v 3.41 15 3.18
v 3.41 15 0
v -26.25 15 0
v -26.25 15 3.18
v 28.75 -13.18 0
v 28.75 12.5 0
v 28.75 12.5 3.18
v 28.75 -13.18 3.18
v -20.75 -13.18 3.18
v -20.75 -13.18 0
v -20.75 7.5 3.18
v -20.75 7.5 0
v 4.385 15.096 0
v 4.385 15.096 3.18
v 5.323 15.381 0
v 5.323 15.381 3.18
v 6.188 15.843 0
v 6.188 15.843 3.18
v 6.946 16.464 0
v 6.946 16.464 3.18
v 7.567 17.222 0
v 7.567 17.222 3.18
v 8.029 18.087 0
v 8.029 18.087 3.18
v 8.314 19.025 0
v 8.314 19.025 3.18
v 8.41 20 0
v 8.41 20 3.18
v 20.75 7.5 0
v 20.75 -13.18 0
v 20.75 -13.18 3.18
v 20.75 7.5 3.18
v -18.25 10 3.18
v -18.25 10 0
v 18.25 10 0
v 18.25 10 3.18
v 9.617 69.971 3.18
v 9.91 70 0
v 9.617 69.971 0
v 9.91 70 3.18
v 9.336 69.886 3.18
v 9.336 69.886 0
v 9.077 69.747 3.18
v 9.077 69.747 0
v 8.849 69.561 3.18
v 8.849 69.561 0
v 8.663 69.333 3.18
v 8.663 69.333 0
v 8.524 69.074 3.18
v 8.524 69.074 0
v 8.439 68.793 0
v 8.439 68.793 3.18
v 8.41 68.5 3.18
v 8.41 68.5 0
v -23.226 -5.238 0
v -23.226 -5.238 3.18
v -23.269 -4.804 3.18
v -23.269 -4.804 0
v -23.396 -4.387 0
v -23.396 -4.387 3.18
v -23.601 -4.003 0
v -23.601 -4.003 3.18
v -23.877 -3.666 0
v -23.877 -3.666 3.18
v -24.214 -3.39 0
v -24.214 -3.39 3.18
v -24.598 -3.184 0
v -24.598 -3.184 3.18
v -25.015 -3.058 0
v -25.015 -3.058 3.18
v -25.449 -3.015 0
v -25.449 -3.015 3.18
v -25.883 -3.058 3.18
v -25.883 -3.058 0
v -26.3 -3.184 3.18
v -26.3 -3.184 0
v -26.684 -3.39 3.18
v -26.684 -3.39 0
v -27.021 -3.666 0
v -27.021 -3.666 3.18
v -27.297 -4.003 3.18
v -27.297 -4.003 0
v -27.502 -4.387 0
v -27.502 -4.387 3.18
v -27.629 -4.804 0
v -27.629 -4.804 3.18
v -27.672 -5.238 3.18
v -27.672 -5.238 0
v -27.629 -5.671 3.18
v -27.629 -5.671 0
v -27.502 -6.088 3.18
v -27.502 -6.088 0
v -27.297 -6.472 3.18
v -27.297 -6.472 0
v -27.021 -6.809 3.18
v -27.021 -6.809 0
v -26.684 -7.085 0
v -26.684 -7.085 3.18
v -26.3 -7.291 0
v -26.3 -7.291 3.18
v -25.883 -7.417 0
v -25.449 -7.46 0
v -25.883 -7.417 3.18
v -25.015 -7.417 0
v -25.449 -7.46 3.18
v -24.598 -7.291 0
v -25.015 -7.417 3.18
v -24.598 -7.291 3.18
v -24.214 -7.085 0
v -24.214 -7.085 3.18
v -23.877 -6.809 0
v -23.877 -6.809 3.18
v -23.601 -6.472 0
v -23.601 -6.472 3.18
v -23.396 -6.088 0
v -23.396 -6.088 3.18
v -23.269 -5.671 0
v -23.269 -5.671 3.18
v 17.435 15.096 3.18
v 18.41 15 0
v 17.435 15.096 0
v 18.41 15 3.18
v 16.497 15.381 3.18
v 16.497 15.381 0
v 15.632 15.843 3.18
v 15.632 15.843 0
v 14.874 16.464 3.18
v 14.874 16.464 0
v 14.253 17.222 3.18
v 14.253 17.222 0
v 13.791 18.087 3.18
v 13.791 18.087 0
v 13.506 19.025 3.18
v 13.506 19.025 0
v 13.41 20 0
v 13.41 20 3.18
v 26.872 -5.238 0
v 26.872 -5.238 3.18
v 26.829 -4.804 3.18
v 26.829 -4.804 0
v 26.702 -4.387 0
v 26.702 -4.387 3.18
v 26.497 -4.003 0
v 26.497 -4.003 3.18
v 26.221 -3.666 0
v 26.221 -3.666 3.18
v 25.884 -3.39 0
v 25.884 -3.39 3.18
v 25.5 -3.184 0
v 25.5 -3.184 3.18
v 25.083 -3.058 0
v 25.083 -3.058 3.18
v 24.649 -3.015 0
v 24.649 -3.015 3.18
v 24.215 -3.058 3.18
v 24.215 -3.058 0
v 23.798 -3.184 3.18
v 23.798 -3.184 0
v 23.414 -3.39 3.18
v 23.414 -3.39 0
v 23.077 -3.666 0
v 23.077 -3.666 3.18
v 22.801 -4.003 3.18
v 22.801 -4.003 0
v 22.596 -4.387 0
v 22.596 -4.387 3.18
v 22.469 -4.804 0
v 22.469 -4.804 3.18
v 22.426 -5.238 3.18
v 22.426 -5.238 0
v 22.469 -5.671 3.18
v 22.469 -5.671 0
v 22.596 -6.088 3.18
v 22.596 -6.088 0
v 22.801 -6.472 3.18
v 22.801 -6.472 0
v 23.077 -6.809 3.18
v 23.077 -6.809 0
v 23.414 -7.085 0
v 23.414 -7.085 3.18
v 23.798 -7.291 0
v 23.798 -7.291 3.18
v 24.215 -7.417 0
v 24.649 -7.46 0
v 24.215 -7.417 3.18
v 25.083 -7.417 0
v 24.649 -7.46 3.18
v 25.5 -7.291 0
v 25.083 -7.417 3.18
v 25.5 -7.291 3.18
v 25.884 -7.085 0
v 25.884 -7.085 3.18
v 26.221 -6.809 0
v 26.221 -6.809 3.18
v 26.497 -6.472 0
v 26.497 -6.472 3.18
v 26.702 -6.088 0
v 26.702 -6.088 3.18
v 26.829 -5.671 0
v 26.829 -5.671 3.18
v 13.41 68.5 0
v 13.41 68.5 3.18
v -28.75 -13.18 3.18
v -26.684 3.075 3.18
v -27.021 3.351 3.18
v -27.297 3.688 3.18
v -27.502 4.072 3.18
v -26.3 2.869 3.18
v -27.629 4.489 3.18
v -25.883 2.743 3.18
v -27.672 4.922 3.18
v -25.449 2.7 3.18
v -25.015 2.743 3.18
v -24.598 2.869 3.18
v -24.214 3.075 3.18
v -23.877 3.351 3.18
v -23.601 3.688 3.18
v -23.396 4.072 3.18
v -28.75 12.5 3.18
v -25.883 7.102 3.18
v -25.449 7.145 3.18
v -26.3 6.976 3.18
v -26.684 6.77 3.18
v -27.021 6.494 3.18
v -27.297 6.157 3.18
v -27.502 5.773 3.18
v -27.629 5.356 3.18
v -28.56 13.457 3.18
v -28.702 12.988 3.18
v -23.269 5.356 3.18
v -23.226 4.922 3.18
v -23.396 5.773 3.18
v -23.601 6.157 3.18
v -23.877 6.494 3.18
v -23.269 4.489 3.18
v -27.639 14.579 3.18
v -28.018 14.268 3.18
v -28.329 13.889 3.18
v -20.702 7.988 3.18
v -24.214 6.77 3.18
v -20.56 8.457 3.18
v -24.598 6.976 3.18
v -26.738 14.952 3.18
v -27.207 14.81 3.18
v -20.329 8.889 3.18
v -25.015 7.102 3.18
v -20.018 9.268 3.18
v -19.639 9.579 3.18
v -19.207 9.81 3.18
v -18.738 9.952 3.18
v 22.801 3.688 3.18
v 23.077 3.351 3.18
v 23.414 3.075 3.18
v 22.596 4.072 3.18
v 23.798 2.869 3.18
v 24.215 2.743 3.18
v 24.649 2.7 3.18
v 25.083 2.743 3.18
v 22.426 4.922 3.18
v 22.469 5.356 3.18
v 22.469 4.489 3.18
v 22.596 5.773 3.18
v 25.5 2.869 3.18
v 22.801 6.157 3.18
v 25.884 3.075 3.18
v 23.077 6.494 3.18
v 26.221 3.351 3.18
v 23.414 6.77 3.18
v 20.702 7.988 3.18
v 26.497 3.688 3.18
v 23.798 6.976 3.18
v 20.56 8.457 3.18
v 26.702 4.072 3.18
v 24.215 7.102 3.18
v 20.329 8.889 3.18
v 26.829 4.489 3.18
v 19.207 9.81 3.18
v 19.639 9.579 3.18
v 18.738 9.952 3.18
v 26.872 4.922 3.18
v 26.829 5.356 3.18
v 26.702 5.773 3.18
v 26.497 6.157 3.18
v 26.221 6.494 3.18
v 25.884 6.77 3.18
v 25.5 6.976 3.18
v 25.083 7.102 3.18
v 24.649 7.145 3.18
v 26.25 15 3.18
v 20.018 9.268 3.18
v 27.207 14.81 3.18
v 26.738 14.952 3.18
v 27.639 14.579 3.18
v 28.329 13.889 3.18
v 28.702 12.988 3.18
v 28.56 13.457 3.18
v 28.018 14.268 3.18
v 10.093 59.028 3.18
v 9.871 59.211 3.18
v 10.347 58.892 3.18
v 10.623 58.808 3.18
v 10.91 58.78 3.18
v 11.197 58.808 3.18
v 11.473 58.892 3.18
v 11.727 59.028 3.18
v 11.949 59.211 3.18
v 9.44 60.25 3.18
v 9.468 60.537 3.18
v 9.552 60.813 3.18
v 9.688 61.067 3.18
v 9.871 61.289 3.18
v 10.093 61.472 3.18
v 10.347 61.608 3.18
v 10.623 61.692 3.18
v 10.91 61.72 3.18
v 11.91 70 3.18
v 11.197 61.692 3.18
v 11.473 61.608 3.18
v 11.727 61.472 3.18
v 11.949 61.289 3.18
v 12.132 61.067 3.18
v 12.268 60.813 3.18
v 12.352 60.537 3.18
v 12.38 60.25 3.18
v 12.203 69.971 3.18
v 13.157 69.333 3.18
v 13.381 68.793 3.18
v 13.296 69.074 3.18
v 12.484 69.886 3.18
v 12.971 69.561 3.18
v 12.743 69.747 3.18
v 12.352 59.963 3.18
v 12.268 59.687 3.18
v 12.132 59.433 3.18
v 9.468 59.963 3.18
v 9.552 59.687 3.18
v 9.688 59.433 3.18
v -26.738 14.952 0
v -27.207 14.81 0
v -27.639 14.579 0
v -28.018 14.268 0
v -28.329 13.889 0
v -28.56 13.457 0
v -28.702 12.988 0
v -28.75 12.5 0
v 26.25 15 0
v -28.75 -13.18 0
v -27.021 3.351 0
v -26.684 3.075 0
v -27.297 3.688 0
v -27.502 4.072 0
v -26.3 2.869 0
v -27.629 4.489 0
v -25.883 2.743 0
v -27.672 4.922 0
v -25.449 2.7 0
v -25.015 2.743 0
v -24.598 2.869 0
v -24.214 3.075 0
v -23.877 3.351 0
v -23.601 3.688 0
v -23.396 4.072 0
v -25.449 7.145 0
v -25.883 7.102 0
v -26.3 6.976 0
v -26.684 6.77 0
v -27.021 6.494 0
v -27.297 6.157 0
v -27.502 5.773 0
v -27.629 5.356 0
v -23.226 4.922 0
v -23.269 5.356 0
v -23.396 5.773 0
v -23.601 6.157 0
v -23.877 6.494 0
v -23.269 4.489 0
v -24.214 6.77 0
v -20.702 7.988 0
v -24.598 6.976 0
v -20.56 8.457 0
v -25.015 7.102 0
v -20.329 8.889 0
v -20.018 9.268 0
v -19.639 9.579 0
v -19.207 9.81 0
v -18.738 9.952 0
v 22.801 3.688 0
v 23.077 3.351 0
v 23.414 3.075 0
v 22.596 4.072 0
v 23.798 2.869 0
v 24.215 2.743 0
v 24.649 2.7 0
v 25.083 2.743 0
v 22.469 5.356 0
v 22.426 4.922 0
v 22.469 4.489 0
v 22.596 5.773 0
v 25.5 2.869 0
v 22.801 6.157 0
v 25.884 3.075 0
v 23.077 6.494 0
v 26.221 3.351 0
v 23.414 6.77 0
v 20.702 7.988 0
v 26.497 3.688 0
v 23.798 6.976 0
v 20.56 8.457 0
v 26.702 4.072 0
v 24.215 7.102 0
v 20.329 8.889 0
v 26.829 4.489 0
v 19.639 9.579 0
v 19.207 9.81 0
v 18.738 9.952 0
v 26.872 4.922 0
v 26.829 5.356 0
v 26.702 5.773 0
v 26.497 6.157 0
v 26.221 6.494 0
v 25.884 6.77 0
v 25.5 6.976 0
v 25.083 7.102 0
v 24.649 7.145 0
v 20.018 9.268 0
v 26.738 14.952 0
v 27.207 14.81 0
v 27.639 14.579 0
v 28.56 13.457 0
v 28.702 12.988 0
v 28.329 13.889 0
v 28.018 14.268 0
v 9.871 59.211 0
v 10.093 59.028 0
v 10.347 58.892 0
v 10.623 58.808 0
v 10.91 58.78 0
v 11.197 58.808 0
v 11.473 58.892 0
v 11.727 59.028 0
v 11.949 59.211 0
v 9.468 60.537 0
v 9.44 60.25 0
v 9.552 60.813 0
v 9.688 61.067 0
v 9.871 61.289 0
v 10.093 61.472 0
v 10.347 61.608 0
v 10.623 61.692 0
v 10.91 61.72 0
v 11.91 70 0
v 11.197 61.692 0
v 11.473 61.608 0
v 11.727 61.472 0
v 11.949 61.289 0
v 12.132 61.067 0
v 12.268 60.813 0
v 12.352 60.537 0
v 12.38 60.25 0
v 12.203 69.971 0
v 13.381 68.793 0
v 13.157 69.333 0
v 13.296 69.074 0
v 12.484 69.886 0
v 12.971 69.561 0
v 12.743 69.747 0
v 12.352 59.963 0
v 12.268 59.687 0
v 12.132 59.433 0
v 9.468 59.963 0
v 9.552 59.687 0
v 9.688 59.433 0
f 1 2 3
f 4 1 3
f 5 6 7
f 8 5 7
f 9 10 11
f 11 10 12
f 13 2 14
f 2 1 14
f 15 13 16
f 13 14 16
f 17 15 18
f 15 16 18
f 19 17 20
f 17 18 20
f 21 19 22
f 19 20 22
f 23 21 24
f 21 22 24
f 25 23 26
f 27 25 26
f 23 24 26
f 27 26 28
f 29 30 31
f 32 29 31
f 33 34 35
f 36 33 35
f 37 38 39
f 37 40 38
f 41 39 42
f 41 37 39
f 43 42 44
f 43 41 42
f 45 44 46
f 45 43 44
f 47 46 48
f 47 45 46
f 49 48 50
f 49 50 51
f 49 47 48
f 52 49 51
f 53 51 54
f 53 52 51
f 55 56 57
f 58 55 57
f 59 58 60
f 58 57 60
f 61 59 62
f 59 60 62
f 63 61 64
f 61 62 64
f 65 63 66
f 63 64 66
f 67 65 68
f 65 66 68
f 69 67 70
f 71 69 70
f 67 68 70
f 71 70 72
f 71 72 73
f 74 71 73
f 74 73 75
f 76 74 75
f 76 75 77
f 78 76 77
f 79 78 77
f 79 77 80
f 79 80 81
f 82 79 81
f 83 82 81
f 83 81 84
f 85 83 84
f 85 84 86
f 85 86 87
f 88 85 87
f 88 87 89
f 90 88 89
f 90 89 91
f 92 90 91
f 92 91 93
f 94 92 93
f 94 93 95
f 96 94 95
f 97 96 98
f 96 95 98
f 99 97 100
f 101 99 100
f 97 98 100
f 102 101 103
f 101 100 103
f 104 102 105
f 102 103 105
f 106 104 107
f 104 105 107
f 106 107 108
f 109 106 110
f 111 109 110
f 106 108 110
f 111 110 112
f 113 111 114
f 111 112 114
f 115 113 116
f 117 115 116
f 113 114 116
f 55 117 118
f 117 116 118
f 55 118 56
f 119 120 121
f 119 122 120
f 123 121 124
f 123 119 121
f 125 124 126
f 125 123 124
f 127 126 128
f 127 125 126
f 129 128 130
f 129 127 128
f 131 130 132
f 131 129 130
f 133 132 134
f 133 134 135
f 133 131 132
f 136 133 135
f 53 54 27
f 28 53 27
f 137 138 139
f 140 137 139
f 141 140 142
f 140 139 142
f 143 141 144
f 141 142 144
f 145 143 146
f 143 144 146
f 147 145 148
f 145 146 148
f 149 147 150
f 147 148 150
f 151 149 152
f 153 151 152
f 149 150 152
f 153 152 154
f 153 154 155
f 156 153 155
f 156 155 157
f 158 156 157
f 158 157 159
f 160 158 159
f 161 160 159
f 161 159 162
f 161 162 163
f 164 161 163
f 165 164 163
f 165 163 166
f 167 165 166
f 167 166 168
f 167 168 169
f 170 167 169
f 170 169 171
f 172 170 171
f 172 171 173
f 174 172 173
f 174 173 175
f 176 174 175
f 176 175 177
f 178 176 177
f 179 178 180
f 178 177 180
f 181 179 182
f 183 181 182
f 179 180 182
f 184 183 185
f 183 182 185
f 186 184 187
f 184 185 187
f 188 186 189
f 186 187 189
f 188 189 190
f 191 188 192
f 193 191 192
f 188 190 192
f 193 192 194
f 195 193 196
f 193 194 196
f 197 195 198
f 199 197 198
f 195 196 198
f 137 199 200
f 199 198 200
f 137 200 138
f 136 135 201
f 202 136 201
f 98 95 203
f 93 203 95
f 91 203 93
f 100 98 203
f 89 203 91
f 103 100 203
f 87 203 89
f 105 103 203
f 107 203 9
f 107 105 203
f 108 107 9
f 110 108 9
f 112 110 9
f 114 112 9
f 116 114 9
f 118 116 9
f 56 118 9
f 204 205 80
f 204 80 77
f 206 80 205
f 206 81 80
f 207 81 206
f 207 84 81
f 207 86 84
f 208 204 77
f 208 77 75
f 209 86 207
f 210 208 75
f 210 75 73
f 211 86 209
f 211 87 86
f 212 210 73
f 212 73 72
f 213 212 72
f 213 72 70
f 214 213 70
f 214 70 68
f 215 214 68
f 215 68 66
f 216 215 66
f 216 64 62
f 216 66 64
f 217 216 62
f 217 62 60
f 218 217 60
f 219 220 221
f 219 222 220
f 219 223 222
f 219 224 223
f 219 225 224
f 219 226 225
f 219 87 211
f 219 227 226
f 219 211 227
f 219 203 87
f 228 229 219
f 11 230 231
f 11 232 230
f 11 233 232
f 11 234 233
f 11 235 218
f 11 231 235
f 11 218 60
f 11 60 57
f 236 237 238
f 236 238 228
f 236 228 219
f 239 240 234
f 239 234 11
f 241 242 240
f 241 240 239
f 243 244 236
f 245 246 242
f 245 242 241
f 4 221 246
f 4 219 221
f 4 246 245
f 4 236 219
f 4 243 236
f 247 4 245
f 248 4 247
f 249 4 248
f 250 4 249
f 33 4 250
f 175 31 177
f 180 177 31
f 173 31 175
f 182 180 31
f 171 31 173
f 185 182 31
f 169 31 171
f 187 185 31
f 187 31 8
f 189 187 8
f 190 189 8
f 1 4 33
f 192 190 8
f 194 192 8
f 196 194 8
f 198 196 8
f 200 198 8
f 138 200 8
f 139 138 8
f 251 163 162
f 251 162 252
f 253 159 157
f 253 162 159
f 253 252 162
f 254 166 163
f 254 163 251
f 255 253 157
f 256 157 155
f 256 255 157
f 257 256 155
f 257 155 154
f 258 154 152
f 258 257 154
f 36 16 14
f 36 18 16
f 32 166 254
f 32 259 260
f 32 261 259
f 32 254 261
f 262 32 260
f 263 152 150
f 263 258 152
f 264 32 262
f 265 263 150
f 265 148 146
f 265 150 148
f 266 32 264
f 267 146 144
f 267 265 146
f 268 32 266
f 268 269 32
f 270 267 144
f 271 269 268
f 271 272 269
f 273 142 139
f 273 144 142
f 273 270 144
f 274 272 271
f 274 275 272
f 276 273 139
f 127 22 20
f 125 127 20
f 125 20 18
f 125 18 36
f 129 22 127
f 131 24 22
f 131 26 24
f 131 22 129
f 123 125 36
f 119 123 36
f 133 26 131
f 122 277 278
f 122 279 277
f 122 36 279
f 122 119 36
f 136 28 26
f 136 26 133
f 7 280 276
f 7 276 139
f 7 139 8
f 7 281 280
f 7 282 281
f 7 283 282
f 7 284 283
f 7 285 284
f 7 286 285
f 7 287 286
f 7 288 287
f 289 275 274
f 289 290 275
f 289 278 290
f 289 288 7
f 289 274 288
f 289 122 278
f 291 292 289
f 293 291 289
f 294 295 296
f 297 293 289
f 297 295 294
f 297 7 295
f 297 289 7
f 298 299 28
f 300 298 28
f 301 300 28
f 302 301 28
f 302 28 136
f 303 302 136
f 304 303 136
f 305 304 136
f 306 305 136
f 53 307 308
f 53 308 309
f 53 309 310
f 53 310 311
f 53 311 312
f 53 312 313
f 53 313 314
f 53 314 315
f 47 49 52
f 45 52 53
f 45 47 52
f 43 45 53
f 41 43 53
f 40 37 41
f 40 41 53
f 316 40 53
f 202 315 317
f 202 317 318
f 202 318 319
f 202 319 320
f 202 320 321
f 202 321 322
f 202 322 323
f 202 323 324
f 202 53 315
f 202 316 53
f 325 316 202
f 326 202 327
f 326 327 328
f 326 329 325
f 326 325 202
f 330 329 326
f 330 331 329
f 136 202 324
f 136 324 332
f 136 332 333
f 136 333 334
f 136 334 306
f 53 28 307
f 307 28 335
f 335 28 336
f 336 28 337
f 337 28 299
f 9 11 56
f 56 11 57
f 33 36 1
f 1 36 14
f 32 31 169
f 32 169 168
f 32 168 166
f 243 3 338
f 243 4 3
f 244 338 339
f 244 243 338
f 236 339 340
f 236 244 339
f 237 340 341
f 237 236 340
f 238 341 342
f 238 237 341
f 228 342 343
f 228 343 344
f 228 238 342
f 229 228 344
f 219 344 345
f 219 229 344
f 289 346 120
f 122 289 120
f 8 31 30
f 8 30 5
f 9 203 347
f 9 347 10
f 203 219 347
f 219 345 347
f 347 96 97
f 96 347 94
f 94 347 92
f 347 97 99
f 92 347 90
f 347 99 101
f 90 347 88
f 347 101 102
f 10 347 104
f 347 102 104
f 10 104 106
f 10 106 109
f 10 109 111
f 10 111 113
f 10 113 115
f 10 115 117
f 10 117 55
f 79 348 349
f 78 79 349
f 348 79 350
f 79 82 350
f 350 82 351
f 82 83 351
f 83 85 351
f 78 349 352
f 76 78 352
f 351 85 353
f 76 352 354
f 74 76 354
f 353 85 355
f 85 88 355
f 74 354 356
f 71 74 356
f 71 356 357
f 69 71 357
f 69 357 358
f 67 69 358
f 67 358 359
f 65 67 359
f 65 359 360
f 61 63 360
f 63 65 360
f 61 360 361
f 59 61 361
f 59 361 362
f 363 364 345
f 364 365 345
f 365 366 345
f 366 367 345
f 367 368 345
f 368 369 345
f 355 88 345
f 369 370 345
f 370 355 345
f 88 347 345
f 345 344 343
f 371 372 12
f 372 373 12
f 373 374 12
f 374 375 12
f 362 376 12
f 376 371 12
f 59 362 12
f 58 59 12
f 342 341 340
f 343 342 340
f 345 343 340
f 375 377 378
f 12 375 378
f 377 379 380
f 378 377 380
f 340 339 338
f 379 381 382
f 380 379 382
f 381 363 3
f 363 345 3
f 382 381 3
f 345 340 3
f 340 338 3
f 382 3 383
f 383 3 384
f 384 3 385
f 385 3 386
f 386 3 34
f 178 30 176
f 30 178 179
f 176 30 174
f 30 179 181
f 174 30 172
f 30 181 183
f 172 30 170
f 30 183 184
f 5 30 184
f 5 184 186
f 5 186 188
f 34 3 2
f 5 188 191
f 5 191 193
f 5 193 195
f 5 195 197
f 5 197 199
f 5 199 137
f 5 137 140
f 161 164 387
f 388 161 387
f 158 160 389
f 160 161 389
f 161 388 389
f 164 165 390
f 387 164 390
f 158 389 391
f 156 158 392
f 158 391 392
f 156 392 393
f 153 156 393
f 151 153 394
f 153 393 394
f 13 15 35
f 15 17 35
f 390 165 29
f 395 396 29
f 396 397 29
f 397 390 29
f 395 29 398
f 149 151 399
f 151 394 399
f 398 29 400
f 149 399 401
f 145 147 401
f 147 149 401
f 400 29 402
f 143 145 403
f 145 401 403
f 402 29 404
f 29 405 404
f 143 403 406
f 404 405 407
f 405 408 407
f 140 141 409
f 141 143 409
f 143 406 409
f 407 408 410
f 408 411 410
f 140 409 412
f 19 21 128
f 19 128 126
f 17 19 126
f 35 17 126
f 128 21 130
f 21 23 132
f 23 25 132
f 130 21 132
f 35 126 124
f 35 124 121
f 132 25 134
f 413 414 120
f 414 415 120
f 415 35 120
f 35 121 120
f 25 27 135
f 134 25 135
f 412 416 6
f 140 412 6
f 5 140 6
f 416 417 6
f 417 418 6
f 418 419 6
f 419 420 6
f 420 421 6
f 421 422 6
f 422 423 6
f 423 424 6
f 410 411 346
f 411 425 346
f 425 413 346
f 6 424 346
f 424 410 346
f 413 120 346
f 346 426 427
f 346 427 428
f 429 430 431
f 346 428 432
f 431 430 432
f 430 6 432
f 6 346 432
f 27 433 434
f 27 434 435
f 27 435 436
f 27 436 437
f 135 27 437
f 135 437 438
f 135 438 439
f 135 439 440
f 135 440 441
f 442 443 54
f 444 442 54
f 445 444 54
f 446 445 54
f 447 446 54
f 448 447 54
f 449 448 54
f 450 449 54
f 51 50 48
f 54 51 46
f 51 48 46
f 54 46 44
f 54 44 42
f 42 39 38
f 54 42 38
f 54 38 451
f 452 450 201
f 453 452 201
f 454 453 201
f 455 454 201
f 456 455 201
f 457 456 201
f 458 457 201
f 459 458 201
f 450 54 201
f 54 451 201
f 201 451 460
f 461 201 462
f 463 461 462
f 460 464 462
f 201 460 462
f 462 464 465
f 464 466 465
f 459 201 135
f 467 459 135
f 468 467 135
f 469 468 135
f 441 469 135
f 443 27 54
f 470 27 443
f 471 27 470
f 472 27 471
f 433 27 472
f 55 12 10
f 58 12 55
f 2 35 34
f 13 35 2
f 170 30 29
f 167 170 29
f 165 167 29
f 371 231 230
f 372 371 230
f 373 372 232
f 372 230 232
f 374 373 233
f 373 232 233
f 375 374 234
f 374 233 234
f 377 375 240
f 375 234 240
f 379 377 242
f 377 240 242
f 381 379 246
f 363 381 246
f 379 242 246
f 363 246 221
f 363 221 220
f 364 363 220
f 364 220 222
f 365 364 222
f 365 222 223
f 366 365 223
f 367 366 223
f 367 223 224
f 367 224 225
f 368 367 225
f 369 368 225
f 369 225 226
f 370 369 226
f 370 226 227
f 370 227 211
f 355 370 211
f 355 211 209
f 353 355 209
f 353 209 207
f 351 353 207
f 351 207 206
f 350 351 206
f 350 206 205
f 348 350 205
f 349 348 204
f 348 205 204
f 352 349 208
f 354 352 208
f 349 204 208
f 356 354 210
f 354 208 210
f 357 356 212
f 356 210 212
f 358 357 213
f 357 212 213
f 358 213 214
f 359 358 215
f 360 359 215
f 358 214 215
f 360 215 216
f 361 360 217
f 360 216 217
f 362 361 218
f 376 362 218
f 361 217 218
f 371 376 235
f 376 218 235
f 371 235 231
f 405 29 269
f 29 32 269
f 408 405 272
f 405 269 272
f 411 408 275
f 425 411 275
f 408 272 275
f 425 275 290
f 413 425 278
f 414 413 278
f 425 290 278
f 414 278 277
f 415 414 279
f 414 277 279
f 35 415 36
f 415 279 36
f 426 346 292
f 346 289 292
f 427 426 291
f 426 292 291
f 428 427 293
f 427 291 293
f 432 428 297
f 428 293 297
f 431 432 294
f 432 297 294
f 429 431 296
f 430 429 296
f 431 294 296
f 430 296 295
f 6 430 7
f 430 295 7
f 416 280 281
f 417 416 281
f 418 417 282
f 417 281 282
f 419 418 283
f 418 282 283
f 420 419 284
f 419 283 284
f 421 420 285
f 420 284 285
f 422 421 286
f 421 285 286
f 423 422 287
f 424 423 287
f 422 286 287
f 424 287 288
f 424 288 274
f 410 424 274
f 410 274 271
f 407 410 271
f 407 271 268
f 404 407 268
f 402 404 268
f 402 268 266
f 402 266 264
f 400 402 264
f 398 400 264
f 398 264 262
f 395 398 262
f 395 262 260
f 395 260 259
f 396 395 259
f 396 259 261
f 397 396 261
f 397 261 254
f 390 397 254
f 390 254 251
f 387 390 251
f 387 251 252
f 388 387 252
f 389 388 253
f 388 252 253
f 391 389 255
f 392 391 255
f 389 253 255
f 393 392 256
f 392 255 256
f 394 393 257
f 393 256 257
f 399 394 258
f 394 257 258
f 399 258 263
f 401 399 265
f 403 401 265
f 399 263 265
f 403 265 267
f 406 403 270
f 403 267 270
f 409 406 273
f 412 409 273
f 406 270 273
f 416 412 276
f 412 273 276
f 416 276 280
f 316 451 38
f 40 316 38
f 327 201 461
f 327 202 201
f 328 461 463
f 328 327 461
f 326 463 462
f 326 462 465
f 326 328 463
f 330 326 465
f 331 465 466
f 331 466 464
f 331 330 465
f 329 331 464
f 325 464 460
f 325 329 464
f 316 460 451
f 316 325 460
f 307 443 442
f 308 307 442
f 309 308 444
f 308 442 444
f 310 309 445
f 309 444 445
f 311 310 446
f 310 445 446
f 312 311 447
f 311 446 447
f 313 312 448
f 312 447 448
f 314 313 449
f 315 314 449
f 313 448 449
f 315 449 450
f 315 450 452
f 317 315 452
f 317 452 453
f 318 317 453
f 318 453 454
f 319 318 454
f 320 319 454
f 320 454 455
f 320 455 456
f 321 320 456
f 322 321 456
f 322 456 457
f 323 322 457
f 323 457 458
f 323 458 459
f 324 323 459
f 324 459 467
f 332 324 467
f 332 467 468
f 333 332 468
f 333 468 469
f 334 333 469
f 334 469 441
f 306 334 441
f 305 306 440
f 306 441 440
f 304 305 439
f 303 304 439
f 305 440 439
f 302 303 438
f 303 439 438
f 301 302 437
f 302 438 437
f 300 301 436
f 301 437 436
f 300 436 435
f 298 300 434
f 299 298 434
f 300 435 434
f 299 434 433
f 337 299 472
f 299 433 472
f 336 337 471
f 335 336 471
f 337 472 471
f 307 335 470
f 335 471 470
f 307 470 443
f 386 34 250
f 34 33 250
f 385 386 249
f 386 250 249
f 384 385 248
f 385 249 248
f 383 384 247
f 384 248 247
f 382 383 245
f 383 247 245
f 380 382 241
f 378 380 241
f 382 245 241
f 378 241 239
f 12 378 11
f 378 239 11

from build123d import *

# Parameters (mm, degrees)
BOSS_EXTRUDE1_DEPTH = 3.18
SKETCH2_R           = 1.47
CUT_EXTRUDE1_DEPTH  = 76.74084037
SKETCH5_W           = 8
SKETCH5_H           = 3.18
BOSS_EXTRUDE2_DEPTH = 3.18
SKETCH6_R           = 2.2225
CUT_EXTRUDE2_DEPTH  = 76.74084037
FILLET1_R           = 5
FILLET2_R           = 1.5
FILLET3_R           = 2.5


with BuildPart() as part:
    # Sketch1 → Boss-Extrude1 (new body)
    with BuildSketch(Plane.XY):
        Polygon((28.75, 15), (13.41, 15), (13.41, 70), (8.41, 70), (8.41, 15), (-28.75, 15), (-28.75, -10), (-20.75, -10), (-20.75, 10), (20.75, 10), (20.75, -10), (28.75, -10), align=None)
    extrude(amount=BOSS_EXTRUDE1_DEPTH)

    # Sketch2 → Cut-Extrude1 (cut, through all)
    with BuildSketch(Plane(origin=(0, 0, 0), x_dir=(-1, 0, 0), z_dir=(0, 0, -1))):
        with Locations((-10.91, 60.25)):
            Circle(SKETCH2_R)
    extrude(amount=-CUT_EXTRUDE1_DEPTH, mode=Mode.SUBTRACT)

    # Sketch5 → Boss-Extrude2 (add)
    with BuildSketch(Plane.XZ.offset(10)):
        with Locations((24.75, 1.59)):
            Rectangle(SKETCH5_W, SKETCH5_H)
        with Locations((-24.75, 1.59)):
            Rectangle(SKETCH5_W, SKETCH5_H)
    extrude(amount=BOSS_EXTRUDE2_DEPTH)

    # Sketch6 → Cut-Extrude2 (cut, through all)
    with BuildSketch(Plane.XY.offset(3.18)):
        with Locations((-25.449, 4.9225)):
            Circle(SKETCH6_R)
        with Locations((-25.449, -5.2375)):
            Circle(SKETCH6_R)
        with Locations((24.649, 4.9225)):
            Circle(SKETCH6_R)
        with Locations((24.649, -5.2375)):
            Circle(SKETCH6_R)
    extrude(amount=-CUT_EXTRUDE2_DEPTH, mode=Mode.SUBTRACT)

    # Fillet1
    fillet1_edges = [part.edges().sort_by_distance(p)[0] for p in [
        (8.41, 15, 1.59),
        (13.41, 15, 1.59),
    ]]
    fillet(fillet1_edges, radius=FILLET1_R)

    # Fillet2
    fillet2_edges = [part.edges().sort_by_distance(p)[0] for p in [
        (8.41, 70, 1.59),
        (13.41, 70, 1.59),
    ]]
    fillet(fillet2_edges, radius=FILLET2_R)

    # Fillet3
    fillet3_edges = [part.edges().sort_by_distance(p)[0] for p in [
        (28.75, 15, 1.59),
        (20.75, 10, 1.59),
        (-20.75, 10, 1.59),
        (-28.75, 15, 1.59),
    ]]
    fillet(fillet3_edges, radius=FILLET3_R)


solid = part.part
